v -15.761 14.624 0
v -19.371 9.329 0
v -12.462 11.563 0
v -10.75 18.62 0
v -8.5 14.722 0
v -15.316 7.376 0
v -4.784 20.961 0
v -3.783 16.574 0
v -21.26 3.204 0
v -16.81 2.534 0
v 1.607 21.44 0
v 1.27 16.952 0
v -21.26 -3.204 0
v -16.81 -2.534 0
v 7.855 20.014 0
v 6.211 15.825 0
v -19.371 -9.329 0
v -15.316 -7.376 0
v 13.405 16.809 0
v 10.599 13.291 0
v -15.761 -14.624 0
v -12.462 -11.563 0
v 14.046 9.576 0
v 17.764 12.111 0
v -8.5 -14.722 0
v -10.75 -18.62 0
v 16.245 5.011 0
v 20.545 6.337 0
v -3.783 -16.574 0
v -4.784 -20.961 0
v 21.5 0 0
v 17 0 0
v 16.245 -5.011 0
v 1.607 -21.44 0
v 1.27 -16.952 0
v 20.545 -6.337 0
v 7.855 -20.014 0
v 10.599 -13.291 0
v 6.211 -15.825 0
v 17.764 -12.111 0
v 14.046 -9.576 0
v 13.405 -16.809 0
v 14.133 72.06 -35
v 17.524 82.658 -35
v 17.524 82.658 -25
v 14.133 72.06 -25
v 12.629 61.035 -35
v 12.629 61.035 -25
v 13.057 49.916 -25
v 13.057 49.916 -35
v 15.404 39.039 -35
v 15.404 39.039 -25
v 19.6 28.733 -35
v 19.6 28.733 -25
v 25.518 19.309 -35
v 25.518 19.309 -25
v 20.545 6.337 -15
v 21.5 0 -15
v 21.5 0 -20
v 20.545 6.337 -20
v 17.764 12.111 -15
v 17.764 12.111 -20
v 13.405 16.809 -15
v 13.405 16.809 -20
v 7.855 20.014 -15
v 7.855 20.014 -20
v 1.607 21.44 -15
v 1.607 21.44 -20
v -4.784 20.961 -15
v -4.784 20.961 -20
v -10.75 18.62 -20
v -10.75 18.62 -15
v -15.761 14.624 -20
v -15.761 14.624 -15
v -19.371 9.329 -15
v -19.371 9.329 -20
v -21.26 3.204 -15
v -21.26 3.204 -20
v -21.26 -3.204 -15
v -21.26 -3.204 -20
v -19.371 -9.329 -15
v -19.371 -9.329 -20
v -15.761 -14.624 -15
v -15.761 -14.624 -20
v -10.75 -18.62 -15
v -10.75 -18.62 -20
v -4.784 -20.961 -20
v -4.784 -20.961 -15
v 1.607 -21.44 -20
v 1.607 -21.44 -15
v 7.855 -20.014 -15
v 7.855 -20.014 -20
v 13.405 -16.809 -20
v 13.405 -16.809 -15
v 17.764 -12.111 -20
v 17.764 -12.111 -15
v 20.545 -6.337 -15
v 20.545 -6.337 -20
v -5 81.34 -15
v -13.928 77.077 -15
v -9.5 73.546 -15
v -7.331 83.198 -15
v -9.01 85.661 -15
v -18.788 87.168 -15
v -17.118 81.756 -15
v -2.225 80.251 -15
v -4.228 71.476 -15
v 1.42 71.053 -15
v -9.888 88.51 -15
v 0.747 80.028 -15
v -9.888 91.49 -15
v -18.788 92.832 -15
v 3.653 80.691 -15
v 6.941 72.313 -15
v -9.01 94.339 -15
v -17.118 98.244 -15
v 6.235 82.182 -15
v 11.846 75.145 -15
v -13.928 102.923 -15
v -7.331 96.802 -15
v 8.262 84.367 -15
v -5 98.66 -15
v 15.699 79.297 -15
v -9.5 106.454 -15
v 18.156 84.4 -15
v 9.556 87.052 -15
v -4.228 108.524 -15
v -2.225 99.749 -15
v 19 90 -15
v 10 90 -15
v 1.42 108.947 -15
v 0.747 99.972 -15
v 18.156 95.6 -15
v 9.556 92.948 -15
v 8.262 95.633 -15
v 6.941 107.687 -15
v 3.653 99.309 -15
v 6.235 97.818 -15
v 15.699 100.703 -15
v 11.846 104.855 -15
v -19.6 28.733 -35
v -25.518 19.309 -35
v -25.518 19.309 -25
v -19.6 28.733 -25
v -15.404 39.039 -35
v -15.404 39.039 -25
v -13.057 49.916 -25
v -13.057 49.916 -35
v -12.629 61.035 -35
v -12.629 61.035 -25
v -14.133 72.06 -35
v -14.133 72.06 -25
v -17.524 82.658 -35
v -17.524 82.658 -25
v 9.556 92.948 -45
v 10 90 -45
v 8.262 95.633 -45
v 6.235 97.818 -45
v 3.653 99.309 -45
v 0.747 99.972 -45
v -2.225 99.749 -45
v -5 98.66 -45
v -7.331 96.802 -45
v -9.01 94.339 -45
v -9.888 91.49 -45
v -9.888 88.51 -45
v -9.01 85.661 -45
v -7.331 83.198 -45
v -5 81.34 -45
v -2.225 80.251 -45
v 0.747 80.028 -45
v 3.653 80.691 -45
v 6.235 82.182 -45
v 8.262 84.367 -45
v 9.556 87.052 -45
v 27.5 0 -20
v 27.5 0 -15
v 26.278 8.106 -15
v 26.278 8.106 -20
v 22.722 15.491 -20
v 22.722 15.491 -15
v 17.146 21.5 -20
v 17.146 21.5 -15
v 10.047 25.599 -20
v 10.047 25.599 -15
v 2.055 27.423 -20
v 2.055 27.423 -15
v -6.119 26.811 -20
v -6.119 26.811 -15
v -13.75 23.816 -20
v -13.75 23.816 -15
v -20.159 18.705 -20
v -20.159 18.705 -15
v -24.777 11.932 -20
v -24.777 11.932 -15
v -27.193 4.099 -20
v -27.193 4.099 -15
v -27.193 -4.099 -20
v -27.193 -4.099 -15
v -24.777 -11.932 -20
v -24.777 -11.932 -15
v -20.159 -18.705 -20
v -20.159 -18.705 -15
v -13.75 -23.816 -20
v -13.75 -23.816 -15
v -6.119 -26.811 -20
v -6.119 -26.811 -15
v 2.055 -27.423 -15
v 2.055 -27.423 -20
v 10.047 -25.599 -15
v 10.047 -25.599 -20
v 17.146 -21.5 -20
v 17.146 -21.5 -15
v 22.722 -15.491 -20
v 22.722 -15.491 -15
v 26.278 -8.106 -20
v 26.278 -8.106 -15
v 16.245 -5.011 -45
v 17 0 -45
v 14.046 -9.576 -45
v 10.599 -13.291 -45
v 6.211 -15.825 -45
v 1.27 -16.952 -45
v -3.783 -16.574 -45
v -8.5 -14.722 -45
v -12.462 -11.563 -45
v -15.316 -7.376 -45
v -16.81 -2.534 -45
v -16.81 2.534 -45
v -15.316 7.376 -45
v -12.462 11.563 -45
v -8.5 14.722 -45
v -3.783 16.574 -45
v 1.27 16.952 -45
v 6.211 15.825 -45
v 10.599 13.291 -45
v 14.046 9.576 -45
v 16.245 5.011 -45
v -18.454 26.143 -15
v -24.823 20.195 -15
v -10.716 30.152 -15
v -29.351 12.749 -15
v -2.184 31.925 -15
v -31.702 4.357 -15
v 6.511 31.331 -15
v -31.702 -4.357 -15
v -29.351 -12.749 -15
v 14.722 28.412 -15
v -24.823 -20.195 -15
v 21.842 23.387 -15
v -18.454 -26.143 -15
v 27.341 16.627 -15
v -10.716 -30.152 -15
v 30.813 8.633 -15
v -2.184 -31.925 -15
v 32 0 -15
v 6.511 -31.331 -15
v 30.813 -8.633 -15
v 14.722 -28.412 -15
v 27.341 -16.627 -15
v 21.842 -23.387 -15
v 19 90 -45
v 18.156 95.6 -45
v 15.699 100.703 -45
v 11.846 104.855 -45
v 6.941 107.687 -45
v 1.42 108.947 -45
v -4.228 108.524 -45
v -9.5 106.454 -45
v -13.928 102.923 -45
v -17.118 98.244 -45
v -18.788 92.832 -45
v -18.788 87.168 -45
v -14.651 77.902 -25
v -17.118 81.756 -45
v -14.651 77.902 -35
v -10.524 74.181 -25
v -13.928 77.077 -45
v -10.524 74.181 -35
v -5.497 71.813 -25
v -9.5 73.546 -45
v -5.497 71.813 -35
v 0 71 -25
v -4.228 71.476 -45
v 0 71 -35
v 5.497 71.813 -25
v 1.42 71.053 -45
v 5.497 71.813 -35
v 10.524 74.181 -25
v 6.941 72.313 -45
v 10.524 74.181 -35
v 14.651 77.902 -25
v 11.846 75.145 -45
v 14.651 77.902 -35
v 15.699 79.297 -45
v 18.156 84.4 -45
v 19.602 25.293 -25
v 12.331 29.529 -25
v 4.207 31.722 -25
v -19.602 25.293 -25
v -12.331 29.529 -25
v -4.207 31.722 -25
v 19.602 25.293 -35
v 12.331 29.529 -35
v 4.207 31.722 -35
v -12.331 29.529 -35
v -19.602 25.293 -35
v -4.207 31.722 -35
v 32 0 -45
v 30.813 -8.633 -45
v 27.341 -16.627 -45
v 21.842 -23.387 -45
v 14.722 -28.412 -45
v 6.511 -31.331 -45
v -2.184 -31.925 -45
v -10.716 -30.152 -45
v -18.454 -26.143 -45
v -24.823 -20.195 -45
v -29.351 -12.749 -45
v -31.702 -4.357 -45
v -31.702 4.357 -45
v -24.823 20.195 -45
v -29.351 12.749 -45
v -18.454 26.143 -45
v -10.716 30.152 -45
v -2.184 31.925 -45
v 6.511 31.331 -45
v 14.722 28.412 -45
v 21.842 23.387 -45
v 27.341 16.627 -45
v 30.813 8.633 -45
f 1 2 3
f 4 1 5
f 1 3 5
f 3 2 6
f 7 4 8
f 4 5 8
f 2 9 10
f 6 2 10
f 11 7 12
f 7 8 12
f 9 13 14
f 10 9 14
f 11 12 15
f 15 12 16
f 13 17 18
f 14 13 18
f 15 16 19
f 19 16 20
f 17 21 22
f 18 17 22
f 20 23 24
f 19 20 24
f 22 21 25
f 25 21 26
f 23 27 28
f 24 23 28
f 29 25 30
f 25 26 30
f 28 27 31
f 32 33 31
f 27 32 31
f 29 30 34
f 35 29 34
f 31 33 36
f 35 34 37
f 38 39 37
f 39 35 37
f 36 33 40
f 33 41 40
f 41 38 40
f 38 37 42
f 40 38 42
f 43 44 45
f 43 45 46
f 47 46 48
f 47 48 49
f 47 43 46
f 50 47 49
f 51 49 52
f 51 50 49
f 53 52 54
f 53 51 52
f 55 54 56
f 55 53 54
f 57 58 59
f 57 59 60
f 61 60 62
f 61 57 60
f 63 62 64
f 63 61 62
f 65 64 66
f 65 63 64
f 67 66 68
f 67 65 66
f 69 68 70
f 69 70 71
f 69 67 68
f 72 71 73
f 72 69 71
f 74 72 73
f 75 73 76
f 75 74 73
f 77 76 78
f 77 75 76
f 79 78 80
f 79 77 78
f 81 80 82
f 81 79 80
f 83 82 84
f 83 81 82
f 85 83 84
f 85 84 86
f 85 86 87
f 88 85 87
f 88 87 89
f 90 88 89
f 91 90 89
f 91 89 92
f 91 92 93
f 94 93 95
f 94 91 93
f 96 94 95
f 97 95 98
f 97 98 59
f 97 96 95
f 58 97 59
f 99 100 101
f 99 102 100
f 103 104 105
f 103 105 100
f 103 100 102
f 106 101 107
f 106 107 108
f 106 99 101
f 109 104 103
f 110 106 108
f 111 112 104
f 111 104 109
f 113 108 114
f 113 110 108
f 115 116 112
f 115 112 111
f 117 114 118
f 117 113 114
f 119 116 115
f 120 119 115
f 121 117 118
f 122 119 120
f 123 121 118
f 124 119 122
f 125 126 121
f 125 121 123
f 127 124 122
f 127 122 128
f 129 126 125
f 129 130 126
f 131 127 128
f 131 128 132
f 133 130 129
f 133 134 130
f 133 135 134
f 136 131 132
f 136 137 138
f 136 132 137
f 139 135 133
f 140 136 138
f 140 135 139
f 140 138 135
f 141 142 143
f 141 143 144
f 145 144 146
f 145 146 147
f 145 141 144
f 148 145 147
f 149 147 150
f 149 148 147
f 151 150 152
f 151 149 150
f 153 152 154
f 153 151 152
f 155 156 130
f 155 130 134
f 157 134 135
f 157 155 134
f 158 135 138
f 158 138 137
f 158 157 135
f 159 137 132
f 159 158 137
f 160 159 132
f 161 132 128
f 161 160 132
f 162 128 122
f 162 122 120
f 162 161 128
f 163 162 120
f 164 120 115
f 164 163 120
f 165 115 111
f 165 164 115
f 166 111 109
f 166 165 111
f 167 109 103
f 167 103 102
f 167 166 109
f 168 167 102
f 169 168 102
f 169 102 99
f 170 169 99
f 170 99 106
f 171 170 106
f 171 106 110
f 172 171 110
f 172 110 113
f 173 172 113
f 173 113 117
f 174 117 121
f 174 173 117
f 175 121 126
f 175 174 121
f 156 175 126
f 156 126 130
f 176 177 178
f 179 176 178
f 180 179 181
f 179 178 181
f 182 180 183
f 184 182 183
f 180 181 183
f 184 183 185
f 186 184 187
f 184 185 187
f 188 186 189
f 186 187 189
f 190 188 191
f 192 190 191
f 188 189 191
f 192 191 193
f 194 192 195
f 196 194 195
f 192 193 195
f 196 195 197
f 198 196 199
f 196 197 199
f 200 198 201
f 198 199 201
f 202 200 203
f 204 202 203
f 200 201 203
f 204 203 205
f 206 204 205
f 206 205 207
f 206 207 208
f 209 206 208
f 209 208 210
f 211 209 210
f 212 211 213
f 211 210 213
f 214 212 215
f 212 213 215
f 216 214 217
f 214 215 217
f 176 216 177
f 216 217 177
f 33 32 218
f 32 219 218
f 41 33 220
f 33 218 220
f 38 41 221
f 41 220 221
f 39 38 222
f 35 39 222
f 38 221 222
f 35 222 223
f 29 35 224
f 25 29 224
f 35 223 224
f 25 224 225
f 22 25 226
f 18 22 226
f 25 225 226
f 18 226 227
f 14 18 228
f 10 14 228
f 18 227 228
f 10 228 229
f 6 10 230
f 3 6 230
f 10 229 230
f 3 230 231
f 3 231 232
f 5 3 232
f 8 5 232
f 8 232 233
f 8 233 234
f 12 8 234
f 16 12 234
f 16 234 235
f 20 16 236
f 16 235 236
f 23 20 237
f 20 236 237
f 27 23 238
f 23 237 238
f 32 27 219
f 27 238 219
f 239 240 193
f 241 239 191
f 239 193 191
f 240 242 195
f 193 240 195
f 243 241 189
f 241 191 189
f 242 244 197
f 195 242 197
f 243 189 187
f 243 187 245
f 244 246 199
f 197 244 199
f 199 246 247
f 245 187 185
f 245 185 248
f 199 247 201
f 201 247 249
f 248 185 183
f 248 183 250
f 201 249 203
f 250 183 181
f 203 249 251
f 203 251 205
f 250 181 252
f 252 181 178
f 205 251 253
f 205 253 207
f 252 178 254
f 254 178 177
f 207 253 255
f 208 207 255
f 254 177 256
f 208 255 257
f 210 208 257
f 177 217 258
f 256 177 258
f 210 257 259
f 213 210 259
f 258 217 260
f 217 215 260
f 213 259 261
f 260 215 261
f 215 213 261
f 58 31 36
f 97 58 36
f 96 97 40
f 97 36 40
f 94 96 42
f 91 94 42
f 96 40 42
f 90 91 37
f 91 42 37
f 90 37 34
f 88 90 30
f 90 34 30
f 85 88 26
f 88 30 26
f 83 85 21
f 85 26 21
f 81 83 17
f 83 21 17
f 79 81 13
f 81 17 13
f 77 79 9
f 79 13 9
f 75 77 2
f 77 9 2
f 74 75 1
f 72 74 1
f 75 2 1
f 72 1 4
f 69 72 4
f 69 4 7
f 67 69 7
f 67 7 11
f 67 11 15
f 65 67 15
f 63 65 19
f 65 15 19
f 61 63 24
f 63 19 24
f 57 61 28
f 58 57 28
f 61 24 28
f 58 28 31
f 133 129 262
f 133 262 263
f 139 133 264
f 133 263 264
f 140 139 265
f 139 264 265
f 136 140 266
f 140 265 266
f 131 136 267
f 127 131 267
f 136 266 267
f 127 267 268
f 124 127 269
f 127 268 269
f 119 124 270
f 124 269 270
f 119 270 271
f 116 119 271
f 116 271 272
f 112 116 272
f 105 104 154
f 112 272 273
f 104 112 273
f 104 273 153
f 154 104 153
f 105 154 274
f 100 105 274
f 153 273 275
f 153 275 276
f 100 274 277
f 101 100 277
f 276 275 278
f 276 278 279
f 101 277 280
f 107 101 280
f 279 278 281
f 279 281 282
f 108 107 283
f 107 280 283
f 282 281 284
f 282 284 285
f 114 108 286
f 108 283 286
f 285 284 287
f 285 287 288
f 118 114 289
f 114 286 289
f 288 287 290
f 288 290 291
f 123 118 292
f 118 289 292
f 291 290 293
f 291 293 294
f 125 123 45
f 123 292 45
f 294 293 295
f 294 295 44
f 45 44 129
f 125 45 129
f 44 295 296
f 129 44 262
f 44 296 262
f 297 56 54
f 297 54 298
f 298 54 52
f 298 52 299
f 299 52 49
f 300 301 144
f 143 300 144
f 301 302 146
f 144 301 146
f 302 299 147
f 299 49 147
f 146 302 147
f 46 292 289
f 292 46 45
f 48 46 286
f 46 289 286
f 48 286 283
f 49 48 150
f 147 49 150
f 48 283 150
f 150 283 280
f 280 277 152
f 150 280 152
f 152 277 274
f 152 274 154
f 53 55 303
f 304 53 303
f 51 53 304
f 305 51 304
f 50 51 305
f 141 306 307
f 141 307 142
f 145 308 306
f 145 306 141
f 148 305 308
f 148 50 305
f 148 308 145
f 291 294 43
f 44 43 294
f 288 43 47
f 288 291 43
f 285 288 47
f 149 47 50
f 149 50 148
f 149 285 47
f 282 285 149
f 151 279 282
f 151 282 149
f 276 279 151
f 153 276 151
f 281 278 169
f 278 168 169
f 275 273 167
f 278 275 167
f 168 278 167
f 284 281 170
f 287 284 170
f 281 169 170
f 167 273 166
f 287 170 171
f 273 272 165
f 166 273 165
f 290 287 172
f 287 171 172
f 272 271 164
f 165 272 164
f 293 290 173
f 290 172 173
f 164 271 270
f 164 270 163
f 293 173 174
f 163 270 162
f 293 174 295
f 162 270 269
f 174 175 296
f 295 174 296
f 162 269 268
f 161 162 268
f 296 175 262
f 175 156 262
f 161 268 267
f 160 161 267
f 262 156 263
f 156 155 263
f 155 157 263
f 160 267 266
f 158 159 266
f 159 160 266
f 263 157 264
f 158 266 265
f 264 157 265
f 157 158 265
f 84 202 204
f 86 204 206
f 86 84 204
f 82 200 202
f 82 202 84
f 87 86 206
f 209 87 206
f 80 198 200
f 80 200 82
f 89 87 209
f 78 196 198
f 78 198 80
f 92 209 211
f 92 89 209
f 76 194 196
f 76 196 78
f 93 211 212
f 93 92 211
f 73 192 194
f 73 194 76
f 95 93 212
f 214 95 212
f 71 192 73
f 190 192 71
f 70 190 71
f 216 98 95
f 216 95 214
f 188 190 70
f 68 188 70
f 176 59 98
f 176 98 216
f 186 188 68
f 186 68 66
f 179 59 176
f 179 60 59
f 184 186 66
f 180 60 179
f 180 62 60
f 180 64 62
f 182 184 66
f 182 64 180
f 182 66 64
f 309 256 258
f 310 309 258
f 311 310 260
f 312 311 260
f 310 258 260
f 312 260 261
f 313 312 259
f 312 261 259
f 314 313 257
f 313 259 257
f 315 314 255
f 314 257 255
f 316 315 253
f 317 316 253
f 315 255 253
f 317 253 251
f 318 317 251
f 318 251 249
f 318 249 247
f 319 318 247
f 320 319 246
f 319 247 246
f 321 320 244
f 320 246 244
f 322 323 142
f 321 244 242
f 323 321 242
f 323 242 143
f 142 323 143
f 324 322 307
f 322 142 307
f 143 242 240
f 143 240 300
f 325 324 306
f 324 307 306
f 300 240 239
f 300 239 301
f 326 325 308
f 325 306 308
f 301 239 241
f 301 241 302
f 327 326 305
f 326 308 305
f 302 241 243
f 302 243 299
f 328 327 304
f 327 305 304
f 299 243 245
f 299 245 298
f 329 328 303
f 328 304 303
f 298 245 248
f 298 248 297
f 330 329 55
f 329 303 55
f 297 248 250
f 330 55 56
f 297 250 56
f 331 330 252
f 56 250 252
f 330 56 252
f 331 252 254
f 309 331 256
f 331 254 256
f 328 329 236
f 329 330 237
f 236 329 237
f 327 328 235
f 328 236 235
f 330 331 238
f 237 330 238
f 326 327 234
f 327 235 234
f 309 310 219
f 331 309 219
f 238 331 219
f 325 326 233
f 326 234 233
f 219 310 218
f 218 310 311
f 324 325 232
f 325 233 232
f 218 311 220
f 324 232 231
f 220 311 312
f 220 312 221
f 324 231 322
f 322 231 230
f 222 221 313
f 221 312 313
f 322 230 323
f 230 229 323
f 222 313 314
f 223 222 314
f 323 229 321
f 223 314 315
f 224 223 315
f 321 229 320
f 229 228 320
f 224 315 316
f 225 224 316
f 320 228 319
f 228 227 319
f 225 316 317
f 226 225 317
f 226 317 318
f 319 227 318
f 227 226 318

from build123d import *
from build123d.topology import SkipClean

# Parameters (mm, degrees)
SKETCH2_R                = 27.5
SKETCH2_R_2              = 21.5
CUT_EXTRUDE1_DEPTH       = 5
BOSS_EXTRUDE1_DEPTH      = 15
BOSS_EXTRUDE1_DEPTH_BACK = 15
SKETCH3_R                = 19
SKETCH3_R_2              = 10
BOSS_EXTRUDE2_DEPTH      = 5
BOSS_EXTRUDE2_DEPTH_BACK = 5


with BuildPart() as part:
    # Sketch1 → Revolve1 (revolve)
    with BuildSketch(Plane(origin=(0, 0, 0), x_dir=(0, 0, -1), z_dir=(1, 0, 0))):
        Polygon((0, 17), (45, 17), (45, 32), (15, 32), (15, 21.5), (0, 21.5), align=None)
    revolve(axis=Axis((0, 0, 0), (0, 0, -1)))

    # Sketch2 → Cut-Extrude1 (cut)
    with SkipClean():  # the faces are left unmerged after this step: merging them gives an invalid solid
        with BuildSketch(Plane.XY.offset(-15)):
            Circle(SKETCH2_R)
            Circle(SKETCH2_R_2, mode=Mode.SUBTRACT)
        extrude(amount=-CUT_EXTRUDE1_DEPTH, mode=Mode.SUBTRACT)



with BuildPart() as body_2:
    # Sketch3 → Boss-Extrude1 (new, two sides: drawn at the far end of the back side and taken through both)
    with BuildSketch(Plane.XY.offset(-30).offset(-BOSS_EXTRUDE1_DEPTH_BACK)):
        with Locations((0, 90)):
            Circle(SKETCH3_R)
        with Locations((0, 90)):
            Circle(SKETCH3_R_2, mode=Mode.SUBTRACT)
    extrude(amount=BOSS_EXTRUDE1_DEPTH + BOSS_EXTRUDE1_DEPTH_BACK)


with BuildPart() as part_1:
    with SkipClean():  # the faces are left unmerged after this step: merging them gives an invalid solid
        add(part.part)

        add(body_2.part)  # Boss-Extrude2 merges body 2
        # Sketch4 → Boss-Extrude2 (add, two sides: drawn at the far end of the back side and taken through both)
        with BuildSketch(Plane.XY.offset(-30).offset(-BOSS_EXTRUDE2_DEPTH_BACK)):
            with BuildLine():
                ThreePointArc((25.517690077, 19.309259259), (0, 32), (-25.517690077, 19.309259259))
                ThreePointArc((-25.517690077, 19.309259259), (-13.056566583, 49.915660424), (-17.5241968, 82.658165997))
                ThreePointArc((-17.5241968, 82.658165997), (0, 71), (17.5241968, 82.658165997))
                ThreePointArc((17.5241968, 82.658165997), (13.056566583, 49.915660424), (25.517690077, 19.309259259))
            make_face()
        extrude(amount=BOSS_EXTRUDE2_DEPTH + BOSS_EXTRUDE2_DEPTH_BACK)


solid = part_1.part
